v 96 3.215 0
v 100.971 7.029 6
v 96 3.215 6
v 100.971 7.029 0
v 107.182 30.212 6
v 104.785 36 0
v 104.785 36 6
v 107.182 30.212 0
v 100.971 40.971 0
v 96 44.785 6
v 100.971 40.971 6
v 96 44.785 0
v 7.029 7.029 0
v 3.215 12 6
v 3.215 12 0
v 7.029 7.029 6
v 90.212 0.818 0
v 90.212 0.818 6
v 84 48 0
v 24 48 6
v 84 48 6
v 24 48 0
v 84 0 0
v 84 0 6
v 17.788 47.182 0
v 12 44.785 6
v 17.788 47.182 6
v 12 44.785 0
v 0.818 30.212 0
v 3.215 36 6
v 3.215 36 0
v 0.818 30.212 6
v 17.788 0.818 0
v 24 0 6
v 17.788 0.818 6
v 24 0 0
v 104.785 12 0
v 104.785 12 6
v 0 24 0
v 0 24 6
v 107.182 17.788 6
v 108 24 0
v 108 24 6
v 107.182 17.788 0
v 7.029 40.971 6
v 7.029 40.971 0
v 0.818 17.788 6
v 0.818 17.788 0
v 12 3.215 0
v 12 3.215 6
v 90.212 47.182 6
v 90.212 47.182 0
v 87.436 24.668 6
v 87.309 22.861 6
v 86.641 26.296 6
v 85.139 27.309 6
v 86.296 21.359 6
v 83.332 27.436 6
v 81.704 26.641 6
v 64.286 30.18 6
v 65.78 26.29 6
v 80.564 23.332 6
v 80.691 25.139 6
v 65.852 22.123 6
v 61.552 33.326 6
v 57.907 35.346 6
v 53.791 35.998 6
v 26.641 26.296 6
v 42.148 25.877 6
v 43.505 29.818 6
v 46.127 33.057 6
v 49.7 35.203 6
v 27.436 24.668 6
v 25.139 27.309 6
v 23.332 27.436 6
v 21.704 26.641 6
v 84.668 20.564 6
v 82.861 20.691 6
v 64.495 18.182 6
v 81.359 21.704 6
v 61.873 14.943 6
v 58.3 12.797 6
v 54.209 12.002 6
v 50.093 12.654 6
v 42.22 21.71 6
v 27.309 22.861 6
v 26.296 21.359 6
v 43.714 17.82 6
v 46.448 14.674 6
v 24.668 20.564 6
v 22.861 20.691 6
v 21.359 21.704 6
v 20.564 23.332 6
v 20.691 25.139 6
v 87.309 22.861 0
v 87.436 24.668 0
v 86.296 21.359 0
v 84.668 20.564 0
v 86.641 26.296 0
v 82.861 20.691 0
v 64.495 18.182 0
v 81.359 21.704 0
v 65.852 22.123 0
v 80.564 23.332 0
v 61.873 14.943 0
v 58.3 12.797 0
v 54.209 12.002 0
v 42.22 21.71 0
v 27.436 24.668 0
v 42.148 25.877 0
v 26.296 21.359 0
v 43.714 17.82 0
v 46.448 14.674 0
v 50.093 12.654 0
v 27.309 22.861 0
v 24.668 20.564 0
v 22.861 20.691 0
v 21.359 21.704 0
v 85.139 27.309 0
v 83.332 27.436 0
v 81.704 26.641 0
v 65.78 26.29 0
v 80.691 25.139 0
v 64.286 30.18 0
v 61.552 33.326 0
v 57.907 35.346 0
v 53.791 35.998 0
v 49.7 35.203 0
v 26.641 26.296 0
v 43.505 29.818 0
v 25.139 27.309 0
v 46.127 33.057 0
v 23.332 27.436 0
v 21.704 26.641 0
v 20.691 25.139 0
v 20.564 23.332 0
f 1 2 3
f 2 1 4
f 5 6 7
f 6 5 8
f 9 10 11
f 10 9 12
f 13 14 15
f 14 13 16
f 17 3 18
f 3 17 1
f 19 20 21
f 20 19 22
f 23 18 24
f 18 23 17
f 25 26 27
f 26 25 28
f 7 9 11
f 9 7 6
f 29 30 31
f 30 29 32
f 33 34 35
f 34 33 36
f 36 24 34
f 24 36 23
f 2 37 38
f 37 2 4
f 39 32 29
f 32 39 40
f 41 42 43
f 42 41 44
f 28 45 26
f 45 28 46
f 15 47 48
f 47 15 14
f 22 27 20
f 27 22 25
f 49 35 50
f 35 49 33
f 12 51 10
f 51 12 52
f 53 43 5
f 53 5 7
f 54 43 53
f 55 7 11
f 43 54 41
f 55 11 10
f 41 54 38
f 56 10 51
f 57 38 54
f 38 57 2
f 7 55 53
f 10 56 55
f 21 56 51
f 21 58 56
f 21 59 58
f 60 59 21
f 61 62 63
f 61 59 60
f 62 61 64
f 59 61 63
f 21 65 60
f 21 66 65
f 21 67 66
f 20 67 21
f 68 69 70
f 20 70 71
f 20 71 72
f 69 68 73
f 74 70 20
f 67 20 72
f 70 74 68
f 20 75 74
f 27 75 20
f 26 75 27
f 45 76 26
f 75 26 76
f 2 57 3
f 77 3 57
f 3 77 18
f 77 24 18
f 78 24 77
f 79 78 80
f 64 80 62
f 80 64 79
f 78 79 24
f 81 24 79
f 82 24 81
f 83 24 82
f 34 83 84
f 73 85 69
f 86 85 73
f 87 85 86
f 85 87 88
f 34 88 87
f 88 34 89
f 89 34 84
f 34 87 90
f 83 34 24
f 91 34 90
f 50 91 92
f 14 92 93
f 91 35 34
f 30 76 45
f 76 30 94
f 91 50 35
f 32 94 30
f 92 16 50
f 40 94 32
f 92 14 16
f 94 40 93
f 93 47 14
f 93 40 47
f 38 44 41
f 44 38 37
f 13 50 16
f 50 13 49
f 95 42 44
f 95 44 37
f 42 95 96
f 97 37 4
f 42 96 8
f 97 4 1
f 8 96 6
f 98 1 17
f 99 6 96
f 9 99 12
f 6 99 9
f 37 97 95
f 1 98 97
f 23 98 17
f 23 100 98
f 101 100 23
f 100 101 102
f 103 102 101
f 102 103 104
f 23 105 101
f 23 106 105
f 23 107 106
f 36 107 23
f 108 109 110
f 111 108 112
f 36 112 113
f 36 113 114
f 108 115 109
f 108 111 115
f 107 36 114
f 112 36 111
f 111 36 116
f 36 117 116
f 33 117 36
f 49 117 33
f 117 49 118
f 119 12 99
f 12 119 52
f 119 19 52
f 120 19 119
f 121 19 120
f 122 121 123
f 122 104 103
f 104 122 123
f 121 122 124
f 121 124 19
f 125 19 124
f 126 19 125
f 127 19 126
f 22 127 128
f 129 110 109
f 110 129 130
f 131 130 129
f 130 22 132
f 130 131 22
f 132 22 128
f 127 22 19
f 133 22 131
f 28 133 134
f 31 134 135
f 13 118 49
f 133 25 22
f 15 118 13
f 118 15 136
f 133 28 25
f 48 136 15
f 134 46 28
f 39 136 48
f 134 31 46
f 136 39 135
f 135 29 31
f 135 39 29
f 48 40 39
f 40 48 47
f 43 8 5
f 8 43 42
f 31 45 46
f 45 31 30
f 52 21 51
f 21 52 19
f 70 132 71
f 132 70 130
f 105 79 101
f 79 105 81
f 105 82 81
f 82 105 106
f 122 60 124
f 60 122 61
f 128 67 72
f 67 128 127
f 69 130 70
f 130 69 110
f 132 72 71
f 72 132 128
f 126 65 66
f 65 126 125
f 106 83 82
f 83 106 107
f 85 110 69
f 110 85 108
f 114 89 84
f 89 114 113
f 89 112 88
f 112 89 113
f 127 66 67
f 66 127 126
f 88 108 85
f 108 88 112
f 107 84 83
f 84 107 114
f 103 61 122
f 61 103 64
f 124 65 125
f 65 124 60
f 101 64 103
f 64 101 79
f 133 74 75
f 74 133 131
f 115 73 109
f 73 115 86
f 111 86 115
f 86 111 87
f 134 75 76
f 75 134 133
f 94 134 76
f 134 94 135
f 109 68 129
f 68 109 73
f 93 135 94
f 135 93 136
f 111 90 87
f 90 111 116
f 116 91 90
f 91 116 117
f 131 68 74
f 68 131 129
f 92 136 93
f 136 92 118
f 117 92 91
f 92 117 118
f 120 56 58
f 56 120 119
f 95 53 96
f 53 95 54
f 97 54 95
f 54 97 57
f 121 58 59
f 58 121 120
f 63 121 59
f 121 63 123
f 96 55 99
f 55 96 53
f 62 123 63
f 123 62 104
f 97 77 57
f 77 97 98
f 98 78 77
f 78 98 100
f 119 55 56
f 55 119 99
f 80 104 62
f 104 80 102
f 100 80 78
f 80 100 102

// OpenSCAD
$fn = 32;

// ----------------------------------------------------------------------
// Spacer plate: obround span 60, caps R24
// ----------------------------------------------------------------------

// --- parameters (mm) ---
bore_r = 12;              // centre bore radius
bolt_r = 3.5;             // bolt hole radius
plate_t = 6;              // plate thickness, Z (extrusion height)
span = 60;                // obround span
cap_r = 24;               // cap radius

profile = [[24, 48], [17.788, 47.182], [12, 44.785], [7.029, 40.971], [3.215, 36], [0.818, 30.212], [0, 24], [0.818, 17.788], [3.215, 12], [7.029, 7.029], [12, 3.215], [17.788, 0.818], [24, 0], [84, 0], [90.212, 0.818], [96, 3.215], [100.971, 7.029], [104.785, 12], [107.182, 17.788], [108, 24], [107.182, 30.212], [104.785, 36], [100.971, 40.971], [96, 44.785], [90.212, 47.182], [84, 48]];  // primary outline, 26 points, counter clockwise
void_1 = [[65.78, 26.29], [64.286, 30.18], [61.552, 33.326], [57.907, 35.346], [53.791, 35.998], [49.7, 35.203], [46.127, 33.057], [43.505, 29.818], [42.148, 25.877], [42.22, 21.71], [43.714, 17.82], [46.448, 14.674], [50.093, 12.654], [54.209, 12.002], [58.3, 12.797], [61.873, 14.943], [64.495, 18.182], [65.852, 22.123]];  // centre bore, 18 points
void_2 = [[27.436, 24.668], [26.641, 26.296], [25.139, 27.309], [23.332, 27.436], [21.704, 26.641], [20.691, 25.139], [20.564, 23.332], [21.359, 21.704], [22.861, 20.691], [24.668, 20.564], [26.296, 21.359], [27.309, 22.861]];  // end hole, 12 points
void_3 = [[87.436, 24.668], [86.641, 26.296], [85.139, 27.309], [83.332, 27.436], [81.704, 26.641], [80.691, 25.139], [80.564, 23.332], [81.359, 21.704], [82.861, 20.691], [84.668, 20.564], [86.296, 21.359], [87.309, 22.861]];  // end hole, 12 points

// --- the one profile operation ---
difference() {
  linear_extrude(height = plate_t) polygon(points = profile);
  translate([0, 0, -1])
    linear_extrude(height = plate_t + 2) polygon(points = void_1);
  translate([0, 0, -1])
    linear_extrude(height = plate_t + 2) polygon(points = void_2);
  translate([0, 0, -1])
    linear_extrude(height = plate_t + 2) polygon(points = void_3);
}
